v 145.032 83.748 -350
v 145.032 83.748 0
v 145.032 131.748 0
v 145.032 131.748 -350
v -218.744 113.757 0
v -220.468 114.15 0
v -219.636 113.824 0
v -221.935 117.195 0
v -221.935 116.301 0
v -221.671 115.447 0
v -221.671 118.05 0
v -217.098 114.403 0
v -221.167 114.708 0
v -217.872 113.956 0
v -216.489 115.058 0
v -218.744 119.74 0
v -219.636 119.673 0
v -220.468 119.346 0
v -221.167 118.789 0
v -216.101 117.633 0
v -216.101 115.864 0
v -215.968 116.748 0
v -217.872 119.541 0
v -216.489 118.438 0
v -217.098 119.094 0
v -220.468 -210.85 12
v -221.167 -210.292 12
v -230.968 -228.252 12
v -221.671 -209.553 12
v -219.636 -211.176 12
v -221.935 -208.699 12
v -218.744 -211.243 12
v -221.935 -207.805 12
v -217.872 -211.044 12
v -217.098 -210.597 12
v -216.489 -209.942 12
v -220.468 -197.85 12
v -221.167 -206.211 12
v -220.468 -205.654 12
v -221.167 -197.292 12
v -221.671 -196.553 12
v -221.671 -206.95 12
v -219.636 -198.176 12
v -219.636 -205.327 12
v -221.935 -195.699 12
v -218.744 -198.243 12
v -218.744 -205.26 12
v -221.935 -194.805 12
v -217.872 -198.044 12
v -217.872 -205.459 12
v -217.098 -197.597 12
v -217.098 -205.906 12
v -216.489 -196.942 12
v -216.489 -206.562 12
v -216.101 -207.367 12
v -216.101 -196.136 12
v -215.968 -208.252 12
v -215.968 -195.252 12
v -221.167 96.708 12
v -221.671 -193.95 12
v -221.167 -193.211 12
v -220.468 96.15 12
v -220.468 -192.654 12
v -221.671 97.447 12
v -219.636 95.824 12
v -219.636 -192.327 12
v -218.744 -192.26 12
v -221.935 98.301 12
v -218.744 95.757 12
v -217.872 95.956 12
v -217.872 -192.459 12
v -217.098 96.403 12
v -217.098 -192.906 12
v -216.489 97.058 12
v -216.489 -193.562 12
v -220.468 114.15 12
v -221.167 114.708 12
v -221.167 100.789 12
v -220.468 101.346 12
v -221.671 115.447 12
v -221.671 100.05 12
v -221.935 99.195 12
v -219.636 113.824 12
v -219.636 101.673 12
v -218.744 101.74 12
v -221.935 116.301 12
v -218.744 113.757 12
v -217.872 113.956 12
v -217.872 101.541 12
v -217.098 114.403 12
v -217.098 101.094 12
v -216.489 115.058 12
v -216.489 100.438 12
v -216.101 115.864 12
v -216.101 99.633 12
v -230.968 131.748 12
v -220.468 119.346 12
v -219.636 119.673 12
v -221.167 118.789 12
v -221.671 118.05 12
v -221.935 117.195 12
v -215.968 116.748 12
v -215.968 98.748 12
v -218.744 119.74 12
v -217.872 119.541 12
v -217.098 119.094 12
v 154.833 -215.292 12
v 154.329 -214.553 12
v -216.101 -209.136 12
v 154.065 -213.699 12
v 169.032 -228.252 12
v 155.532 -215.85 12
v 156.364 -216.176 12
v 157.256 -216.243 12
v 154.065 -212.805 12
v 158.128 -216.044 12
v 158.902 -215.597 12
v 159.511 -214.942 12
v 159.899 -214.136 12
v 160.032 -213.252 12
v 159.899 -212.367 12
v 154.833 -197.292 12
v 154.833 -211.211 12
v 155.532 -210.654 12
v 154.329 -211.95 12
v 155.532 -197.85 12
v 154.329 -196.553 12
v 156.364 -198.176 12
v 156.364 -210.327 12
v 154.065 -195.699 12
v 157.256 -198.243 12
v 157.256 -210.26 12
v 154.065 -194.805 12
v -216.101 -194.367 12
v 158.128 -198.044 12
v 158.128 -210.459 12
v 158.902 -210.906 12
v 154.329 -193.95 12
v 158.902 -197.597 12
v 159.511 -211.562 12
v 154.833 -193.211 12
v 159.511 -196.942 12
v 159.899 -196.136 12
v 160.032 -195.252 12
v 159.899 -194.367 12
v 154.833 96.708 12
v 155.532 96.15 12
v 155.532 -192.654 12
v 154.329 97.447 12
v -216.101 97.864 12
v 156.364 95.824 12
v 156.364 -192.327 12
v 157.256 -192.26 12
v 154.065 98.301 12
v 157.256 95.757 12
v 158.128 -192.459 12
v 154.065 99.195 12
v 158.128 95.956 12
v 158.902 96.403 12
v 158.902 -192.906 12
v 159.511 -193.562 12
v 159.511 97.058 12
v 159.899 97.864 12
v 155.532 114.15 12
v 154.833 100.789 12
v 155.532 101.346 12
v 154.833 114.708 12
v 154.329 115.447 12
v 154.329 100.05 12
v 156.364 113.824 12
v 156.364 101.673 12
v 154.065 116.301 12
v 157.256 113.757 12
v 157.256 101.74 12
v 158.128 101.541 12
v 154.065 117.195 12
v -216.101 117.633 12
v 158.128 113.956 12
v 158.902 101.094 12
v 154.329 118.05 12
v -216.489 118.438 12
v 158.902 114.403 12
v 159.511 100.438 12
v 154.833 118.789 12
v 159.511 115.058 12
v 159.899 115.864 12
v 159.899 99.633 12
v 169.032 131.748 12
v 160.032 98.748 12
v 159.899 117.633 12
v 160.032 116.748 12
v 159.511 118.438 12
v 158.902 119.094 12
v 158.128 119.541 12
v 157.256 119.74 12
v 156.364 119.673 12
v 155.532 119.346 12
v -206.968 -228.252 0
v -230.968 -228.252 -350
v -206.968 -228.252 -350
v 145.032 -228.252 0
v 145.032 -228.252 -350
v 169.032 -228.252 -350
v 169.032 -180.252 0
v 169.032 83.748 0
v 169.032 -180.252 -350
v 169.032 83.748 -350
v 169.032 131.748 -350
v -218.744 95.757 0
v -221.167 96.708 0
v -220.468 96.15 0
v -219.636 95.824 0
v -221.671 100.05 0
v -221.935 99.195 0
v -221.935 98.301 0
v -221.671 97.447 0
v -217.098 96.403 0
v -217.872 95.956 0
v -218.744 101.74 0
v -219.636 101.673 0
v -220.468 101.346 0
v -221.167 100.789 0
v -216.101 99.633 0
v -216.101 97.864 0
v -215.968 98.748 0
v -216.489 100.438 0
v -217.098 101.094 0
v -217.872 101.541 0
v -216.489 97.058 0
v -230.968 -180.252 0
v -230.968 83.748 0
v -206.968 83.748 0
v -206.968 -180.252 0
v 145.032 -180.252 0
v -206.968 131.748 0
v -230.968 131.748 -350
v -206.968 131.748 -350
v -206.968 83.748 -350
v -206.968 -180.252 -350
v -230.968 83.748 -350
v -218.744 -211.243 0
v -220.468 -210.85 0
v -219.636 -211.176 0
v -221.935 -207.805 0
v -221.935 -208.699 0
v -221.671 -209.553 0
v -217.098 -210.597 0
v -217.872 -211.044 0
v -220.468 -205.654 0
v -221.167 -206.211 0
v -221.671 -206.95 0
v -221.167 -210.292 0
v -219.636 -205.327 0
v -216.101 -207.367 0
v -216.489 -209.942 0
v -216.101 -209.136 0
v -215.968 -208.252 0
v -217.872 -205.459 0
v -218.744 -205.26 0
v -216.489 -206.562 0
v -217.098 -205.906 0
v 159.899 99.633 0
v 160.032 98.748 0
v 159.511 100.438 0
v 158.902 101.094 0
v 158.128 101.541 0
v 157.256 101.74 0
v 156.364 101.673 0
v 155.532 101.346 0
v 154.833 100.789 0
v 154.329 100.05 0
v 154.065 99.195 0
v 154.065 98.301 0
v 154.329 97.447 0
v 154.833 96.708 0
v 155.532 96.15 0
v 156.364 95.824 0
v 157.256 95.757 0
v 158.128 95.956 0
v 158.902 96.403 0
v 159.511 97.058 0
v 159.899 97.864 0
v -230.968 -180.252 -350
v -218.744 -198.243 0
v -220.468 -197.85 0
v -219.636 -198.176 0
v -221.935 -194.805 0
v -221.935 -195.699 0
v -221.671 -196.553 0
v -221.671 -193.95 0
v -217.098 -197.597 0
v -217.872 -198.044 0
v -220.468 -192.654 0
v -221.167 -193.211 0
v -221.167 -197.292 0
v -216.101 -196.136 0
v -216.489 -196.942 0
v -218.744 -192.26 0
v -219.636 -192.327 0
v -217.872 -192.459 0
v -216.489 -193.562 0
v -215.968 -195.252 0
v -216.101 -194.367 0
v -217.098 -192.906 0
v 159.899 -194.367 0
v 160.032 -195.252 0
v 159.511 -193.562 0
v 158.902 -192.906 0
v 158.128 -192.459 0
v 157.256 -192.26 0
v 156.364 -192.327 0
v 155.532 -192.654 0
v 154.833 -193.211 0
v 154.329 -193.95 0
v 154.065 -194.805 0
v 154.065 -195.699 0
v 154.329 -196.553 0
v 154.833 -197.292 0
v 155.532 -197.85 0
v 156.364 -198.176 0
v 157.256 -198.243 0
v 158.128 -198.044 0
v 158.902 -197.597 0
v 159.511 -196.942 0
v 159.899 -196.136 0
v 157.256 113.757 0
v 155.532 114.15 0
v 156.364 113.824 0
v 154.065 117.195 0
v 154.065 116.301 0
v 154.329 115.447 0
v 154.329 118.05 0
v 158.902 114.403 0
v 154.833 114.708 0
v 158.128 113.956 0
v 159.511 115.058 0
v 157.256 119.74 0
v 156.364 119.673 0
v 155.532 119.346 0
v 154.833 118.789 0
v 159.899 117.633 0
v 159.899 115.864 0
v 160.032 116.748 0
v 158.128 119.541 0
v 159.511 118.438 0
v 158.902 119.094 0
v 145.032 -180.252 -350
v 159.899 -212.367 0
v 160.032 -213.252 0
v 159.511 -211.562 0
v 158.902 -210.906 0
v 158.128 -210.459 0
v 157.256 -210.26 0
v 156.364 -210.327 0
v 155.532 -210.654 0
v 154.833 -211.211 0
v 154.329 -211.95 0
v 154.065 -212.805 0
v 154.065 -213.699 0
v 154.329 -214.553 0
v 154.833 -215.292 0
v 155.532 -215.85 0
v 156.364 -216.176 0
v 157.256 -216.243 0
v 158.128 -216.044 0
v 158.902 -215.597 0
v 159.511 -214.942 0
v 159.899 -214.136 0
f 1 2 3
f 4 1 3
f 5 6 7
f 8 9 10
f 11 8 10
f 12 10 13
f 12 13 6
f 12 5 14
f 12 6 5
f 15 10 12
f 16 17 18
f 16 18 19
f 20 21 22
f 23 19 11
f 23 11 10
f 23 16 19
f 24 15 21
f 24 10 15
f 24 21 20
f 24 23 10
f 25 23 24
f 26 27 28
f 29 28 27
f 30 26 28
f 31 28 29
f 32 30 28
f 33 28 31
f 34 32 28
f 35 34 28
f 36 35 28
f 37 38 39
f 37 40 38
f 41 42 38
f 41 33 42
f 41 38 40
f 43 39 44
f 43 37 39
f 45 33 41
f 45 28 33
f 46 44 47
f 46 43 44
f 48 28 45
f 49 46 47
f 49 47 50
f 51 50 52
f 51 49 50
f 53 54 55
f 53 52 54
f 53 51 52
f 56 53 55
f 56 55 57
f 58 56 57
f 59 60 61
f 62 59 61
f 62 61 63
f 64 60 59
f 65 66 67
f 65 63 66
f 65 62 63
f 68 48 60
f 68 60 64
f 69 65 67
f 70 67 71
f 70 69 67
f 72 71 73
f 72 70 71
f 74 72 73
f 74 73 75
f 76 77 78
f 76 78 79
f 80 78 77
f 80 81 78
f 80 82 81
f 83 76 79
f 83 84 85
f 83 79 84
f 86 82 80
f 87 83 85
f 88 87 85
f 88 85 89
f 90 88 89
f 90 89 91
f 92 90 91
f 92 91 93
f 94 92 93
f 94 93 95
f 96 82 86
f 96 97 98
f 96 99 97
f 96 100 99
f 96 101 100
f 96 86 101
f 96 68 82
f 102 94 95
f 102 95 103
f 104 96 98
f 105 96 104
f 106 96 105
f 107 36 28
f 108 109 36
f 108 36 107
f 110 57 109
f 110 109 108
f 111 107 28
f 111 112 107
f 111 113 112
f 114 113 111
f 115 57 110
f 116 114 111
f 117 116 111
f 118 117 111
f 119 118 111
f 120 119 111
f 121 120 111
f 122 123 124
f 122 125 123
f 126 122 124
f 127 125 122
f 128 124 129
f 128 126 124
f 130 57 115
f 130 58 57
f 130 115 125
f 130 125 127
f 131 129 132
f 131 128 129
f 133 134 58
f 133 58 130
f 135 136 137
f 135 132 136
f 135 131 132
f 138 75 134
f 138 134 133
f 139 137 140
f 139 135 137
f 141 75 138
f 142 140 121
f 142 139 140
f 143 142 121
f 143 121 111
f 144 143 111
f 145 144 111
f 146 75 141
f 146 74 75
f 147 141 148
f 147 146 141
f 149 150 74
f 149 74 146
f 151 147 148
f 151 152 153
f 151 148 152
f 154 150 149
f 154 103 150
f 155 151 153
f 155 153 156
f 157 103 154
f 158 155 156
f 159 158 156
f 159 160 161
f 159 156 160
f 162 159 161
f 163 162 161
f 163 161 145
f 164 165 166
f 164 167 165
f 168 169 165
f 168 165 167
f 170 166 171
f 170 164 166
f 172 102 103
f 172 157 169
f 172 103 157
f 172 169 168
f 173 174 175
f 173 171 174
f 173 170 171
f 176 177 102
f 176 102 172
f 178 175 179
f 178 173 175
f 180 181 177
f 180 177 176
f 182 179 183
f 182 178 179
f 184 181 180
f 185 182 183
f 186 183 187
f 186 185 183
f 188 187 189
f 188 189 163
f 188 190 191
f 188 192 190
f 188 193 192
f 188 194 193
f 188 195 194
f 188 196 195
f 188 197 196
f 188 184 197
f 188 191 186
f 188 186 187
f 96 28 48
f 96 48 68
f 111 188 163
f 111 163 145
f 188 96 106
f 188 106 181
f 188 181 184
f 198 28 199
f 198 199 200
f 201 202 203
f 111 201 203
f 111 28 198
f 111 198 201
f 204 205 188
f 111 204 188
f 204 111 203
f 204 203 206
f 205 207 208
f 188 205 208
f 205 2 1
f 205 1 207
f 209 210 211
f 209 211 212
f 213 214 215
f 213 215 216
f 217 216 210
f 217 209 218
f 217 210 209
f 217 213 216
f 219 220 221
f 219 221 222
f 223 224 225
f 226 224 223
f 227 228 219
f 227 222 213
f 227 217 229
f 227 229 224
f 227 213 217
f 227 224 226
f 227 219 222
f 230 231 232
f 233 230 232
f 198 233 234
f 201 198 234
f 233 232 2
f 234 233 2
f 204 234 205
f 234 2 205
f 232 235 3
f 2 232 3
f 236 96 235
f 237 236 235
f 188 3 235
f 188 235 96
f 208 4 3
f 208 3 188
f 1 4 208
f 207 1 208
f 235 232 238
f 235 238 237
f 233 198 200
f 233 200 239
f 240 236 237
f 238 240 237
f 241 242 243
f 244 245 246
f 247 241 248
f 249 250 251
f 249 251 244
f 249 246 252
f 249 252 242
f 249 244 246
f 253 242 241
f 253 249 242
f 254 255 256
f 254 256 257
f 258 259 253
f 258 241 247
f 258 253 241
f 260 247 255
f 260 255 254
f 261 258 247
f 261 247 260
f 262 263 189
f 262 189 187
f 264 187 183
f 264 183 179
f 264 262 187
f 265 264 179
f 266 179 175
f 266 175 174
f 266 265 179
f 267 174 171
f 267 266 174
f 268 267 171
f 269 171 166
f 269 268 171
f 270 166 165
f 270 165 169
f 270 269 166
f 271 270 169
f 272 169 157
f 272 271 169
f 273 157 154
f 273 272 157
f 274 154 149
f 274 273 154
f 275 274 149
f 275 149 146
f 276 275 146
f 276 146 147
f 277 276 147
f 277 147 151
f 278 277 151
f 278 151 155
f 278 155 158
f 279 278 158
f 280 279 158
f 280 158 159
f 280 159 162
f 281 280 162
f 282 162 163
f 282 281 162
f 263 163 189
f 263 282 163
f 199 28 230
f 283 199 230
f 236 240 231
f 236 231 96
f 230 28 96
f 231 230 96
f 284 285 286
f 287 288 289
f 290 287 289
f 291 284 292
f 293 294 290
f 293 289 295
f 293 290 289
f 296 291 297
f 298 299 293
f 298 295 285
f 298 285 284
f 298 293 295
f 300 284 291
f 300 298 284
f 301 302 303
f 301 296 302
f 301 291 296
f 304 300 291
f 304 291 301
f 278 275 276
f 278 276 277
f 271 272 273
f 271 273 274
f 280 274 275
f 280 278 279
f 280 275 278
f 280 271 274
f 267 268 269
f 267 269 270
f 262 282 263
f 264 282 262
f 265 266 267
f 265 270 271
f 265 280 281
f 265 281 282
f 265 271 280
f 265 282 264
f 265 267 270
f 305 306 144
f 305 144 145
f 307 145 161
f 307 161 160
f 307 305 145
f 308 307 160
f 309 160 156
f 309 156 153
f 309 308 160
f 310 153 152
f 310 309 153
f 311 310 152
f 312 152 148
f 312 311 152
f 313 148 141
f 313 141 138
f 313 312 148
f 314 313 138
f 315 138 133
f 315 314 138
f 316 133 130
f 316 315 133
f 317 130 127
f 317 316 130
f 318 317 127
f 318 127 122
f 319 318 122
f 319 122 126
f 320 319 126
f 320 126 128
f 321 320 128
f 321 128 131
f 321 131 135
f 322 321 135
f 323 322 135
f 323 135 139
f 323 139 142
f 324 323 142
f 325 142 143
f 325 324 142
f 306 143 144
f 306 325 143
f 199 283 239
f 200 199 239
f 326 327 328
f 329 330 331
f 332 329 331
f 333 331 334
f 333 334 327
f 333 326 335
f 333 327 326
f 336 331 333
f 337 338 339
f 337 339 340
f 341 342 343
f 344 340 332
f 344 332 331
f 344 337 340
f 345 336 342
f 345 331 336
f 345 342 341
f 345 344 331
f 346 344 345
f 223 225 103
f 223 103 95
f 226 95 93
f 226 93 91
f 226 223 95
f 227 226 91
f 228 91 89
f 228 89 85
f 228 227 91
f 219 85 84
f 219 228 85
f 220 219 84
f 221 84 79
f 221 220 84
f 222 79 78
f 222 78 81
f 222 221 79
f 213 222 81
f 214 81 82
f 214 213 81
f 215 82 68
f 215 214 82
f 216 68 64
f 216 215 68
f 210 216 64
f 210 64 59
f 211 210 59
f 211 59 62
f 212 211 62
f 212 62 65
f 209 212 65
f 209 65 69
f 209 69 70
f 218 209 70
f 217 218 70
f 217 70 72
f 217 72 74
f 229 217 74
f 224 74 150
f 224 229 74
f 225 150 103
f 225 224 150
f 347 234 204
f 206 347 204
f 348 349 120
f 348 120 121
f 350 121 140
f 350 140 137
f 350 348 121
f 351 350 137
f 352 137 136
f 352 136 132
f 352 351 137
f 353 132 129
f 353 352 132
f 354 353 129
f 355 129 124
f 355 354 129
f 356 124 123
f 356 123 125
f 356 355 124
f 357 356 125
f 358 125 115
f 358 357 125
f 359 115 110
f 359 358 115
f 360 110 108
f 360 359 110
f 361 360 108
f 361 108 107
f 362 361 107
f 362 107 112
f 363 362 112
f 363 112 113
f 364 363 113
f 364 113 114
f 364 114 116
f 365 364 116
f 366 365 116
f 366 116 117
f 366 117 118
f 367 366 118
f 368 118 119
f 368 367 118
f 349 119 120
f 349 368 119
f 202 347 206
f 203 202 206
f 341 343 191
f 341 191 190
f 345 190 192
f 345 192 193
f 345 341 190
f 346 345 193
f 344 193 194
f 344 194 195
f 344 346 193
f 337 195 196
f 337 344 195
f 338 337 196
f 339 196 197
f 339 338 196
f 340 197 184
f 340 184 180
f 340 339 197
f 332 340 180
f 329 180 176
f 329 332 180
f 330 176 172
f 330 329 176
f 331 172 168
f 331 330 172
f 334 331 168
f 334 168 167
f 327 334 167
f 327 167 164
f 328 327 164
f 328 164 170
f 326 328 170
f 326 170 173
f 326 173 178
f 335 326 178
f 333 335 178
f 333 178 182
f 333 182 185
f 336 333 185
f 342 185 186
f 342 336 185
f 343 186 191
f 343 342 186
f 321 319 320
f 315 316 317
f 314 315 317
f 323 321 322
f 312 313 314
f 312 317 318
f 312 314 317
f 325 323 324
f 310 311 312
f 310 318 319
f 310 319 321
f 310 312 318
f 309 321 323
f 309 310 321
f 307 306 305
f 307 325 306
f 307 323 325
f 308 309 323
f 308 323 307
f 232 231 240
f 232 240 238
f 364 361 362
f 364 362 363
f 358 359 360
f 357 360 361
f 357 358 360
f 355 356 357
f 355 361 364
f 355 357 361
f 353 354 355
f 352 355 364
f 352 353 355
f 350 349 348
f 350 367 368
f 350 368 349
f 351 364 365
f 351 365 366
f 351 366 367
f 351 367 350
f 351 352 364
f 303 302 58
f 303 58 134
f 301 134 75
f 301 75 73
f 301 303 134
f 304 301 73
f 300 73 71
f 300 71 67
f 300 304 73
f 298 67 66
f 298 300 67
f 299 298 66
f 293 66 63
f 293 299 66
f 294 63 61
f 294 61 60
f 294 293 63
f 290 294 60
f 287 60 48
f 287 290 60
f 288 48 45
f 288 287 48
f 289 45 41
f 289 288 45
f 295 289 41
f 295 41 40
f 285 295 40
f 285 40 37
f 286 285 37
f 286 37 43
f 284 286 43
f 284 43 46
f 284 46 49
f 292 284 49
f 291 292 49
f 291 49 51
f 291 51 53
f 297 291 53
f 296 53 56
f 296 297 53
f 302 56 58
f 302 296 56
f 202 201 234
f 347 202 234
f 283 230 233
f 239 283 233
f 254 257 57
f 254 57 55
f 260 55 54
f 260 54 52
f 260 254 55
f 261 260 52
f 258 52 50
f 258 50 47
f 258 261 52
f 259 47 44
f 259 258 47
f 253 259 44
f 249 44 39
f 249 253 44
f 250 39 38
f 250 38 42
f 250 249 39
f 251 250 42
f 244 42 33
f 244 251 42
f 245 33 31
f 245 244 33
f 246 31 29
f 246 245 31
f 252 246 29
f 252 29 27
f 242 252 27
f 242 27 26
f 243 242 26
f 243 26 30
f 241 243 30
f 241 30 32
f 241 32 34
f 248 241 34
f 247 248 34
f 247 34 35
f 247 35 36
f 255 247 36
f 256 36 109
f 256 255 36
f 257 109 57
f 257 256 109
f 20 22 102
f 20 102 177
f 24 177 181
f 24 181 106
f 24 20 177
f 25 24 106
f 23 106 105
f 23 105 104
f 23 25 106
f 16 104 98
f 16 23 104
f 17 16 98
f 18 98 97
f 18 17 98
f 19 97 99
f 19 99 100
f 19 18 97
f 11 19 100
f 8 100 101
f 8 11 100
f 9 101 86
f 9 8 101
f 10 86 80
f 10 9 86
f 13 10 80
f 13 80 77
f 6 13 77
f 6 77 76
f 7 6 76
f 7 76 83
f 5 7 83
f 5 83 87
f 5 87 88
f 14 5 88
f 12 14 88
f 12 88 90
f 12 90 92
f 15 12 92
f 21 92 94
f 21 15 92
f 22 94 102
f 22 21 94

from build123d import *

# Parameters (mm, degrees)
F0_W     = 400
F0_H     = 360
F0_R     = 3
F2_DEPTH = 12
F1_W     = 24
F1_H     = 48
F3_DEPTH = 350


with BuildPart() as f2:
    # F0 (on Top) → F2 (new body)
    with BuildSketch(Plane.XY):
        with Locations((-30.968213, -48.251697)):
            Rectangle(F0_W, F0_H)
        with Locations((-218.968213, -208.251697)):
            Circle(F0_R, mode=Mode.SUBTRACT)
        with Locations((-218.968213, -195.251697)):
            Circle(F0_R, mode=Mode.SUBTRACT)
        with Locations((157.031787, -213.251697)):
            Circle(F0_R, mode=Mode.SUBTRACT)
        with Locations((157.031787, -195.251697)):
            Circle(F0_R, mode=Mode.SUBTRACT)
        with Locations((-218.968213, 98.748303)):
            Circle(F0_R, mode=Mode.SUBTRACT)
        with Locations((-218.968213, 116.748303)):
            Circle(F0_R, mode=Mode.SUBTRACT)
        with Locations((157.031787, 98.748303)):
            Circle(F0_R, mode=Mode.SUBTRACT)
        with Locations((157.031787, 116.748303)):
            Circle(F0_R, mode=Mode.SUBTRACT)
    extrude(amount=F2_DEPTH)

    # F1 (on Top) → F3 (join)
    with BuildSketch(Plane.XY):
        with Locations((-218.968213, -204.251697)):
            Rectangle(F1_W, F1_H)
        with Locations((-218.968213, 107.748303)):
            Rectangle(F1_W, F1_H)
        with Locations((157.031787, 107.748303)):
            Rectangle(F1_W, F1_H)
        with Locations((157.031787, -204.251697)):
            Rectangle(F1_W, F1_H)
    extrude(amount=-F3_DEPTH)


solid = f2.part
